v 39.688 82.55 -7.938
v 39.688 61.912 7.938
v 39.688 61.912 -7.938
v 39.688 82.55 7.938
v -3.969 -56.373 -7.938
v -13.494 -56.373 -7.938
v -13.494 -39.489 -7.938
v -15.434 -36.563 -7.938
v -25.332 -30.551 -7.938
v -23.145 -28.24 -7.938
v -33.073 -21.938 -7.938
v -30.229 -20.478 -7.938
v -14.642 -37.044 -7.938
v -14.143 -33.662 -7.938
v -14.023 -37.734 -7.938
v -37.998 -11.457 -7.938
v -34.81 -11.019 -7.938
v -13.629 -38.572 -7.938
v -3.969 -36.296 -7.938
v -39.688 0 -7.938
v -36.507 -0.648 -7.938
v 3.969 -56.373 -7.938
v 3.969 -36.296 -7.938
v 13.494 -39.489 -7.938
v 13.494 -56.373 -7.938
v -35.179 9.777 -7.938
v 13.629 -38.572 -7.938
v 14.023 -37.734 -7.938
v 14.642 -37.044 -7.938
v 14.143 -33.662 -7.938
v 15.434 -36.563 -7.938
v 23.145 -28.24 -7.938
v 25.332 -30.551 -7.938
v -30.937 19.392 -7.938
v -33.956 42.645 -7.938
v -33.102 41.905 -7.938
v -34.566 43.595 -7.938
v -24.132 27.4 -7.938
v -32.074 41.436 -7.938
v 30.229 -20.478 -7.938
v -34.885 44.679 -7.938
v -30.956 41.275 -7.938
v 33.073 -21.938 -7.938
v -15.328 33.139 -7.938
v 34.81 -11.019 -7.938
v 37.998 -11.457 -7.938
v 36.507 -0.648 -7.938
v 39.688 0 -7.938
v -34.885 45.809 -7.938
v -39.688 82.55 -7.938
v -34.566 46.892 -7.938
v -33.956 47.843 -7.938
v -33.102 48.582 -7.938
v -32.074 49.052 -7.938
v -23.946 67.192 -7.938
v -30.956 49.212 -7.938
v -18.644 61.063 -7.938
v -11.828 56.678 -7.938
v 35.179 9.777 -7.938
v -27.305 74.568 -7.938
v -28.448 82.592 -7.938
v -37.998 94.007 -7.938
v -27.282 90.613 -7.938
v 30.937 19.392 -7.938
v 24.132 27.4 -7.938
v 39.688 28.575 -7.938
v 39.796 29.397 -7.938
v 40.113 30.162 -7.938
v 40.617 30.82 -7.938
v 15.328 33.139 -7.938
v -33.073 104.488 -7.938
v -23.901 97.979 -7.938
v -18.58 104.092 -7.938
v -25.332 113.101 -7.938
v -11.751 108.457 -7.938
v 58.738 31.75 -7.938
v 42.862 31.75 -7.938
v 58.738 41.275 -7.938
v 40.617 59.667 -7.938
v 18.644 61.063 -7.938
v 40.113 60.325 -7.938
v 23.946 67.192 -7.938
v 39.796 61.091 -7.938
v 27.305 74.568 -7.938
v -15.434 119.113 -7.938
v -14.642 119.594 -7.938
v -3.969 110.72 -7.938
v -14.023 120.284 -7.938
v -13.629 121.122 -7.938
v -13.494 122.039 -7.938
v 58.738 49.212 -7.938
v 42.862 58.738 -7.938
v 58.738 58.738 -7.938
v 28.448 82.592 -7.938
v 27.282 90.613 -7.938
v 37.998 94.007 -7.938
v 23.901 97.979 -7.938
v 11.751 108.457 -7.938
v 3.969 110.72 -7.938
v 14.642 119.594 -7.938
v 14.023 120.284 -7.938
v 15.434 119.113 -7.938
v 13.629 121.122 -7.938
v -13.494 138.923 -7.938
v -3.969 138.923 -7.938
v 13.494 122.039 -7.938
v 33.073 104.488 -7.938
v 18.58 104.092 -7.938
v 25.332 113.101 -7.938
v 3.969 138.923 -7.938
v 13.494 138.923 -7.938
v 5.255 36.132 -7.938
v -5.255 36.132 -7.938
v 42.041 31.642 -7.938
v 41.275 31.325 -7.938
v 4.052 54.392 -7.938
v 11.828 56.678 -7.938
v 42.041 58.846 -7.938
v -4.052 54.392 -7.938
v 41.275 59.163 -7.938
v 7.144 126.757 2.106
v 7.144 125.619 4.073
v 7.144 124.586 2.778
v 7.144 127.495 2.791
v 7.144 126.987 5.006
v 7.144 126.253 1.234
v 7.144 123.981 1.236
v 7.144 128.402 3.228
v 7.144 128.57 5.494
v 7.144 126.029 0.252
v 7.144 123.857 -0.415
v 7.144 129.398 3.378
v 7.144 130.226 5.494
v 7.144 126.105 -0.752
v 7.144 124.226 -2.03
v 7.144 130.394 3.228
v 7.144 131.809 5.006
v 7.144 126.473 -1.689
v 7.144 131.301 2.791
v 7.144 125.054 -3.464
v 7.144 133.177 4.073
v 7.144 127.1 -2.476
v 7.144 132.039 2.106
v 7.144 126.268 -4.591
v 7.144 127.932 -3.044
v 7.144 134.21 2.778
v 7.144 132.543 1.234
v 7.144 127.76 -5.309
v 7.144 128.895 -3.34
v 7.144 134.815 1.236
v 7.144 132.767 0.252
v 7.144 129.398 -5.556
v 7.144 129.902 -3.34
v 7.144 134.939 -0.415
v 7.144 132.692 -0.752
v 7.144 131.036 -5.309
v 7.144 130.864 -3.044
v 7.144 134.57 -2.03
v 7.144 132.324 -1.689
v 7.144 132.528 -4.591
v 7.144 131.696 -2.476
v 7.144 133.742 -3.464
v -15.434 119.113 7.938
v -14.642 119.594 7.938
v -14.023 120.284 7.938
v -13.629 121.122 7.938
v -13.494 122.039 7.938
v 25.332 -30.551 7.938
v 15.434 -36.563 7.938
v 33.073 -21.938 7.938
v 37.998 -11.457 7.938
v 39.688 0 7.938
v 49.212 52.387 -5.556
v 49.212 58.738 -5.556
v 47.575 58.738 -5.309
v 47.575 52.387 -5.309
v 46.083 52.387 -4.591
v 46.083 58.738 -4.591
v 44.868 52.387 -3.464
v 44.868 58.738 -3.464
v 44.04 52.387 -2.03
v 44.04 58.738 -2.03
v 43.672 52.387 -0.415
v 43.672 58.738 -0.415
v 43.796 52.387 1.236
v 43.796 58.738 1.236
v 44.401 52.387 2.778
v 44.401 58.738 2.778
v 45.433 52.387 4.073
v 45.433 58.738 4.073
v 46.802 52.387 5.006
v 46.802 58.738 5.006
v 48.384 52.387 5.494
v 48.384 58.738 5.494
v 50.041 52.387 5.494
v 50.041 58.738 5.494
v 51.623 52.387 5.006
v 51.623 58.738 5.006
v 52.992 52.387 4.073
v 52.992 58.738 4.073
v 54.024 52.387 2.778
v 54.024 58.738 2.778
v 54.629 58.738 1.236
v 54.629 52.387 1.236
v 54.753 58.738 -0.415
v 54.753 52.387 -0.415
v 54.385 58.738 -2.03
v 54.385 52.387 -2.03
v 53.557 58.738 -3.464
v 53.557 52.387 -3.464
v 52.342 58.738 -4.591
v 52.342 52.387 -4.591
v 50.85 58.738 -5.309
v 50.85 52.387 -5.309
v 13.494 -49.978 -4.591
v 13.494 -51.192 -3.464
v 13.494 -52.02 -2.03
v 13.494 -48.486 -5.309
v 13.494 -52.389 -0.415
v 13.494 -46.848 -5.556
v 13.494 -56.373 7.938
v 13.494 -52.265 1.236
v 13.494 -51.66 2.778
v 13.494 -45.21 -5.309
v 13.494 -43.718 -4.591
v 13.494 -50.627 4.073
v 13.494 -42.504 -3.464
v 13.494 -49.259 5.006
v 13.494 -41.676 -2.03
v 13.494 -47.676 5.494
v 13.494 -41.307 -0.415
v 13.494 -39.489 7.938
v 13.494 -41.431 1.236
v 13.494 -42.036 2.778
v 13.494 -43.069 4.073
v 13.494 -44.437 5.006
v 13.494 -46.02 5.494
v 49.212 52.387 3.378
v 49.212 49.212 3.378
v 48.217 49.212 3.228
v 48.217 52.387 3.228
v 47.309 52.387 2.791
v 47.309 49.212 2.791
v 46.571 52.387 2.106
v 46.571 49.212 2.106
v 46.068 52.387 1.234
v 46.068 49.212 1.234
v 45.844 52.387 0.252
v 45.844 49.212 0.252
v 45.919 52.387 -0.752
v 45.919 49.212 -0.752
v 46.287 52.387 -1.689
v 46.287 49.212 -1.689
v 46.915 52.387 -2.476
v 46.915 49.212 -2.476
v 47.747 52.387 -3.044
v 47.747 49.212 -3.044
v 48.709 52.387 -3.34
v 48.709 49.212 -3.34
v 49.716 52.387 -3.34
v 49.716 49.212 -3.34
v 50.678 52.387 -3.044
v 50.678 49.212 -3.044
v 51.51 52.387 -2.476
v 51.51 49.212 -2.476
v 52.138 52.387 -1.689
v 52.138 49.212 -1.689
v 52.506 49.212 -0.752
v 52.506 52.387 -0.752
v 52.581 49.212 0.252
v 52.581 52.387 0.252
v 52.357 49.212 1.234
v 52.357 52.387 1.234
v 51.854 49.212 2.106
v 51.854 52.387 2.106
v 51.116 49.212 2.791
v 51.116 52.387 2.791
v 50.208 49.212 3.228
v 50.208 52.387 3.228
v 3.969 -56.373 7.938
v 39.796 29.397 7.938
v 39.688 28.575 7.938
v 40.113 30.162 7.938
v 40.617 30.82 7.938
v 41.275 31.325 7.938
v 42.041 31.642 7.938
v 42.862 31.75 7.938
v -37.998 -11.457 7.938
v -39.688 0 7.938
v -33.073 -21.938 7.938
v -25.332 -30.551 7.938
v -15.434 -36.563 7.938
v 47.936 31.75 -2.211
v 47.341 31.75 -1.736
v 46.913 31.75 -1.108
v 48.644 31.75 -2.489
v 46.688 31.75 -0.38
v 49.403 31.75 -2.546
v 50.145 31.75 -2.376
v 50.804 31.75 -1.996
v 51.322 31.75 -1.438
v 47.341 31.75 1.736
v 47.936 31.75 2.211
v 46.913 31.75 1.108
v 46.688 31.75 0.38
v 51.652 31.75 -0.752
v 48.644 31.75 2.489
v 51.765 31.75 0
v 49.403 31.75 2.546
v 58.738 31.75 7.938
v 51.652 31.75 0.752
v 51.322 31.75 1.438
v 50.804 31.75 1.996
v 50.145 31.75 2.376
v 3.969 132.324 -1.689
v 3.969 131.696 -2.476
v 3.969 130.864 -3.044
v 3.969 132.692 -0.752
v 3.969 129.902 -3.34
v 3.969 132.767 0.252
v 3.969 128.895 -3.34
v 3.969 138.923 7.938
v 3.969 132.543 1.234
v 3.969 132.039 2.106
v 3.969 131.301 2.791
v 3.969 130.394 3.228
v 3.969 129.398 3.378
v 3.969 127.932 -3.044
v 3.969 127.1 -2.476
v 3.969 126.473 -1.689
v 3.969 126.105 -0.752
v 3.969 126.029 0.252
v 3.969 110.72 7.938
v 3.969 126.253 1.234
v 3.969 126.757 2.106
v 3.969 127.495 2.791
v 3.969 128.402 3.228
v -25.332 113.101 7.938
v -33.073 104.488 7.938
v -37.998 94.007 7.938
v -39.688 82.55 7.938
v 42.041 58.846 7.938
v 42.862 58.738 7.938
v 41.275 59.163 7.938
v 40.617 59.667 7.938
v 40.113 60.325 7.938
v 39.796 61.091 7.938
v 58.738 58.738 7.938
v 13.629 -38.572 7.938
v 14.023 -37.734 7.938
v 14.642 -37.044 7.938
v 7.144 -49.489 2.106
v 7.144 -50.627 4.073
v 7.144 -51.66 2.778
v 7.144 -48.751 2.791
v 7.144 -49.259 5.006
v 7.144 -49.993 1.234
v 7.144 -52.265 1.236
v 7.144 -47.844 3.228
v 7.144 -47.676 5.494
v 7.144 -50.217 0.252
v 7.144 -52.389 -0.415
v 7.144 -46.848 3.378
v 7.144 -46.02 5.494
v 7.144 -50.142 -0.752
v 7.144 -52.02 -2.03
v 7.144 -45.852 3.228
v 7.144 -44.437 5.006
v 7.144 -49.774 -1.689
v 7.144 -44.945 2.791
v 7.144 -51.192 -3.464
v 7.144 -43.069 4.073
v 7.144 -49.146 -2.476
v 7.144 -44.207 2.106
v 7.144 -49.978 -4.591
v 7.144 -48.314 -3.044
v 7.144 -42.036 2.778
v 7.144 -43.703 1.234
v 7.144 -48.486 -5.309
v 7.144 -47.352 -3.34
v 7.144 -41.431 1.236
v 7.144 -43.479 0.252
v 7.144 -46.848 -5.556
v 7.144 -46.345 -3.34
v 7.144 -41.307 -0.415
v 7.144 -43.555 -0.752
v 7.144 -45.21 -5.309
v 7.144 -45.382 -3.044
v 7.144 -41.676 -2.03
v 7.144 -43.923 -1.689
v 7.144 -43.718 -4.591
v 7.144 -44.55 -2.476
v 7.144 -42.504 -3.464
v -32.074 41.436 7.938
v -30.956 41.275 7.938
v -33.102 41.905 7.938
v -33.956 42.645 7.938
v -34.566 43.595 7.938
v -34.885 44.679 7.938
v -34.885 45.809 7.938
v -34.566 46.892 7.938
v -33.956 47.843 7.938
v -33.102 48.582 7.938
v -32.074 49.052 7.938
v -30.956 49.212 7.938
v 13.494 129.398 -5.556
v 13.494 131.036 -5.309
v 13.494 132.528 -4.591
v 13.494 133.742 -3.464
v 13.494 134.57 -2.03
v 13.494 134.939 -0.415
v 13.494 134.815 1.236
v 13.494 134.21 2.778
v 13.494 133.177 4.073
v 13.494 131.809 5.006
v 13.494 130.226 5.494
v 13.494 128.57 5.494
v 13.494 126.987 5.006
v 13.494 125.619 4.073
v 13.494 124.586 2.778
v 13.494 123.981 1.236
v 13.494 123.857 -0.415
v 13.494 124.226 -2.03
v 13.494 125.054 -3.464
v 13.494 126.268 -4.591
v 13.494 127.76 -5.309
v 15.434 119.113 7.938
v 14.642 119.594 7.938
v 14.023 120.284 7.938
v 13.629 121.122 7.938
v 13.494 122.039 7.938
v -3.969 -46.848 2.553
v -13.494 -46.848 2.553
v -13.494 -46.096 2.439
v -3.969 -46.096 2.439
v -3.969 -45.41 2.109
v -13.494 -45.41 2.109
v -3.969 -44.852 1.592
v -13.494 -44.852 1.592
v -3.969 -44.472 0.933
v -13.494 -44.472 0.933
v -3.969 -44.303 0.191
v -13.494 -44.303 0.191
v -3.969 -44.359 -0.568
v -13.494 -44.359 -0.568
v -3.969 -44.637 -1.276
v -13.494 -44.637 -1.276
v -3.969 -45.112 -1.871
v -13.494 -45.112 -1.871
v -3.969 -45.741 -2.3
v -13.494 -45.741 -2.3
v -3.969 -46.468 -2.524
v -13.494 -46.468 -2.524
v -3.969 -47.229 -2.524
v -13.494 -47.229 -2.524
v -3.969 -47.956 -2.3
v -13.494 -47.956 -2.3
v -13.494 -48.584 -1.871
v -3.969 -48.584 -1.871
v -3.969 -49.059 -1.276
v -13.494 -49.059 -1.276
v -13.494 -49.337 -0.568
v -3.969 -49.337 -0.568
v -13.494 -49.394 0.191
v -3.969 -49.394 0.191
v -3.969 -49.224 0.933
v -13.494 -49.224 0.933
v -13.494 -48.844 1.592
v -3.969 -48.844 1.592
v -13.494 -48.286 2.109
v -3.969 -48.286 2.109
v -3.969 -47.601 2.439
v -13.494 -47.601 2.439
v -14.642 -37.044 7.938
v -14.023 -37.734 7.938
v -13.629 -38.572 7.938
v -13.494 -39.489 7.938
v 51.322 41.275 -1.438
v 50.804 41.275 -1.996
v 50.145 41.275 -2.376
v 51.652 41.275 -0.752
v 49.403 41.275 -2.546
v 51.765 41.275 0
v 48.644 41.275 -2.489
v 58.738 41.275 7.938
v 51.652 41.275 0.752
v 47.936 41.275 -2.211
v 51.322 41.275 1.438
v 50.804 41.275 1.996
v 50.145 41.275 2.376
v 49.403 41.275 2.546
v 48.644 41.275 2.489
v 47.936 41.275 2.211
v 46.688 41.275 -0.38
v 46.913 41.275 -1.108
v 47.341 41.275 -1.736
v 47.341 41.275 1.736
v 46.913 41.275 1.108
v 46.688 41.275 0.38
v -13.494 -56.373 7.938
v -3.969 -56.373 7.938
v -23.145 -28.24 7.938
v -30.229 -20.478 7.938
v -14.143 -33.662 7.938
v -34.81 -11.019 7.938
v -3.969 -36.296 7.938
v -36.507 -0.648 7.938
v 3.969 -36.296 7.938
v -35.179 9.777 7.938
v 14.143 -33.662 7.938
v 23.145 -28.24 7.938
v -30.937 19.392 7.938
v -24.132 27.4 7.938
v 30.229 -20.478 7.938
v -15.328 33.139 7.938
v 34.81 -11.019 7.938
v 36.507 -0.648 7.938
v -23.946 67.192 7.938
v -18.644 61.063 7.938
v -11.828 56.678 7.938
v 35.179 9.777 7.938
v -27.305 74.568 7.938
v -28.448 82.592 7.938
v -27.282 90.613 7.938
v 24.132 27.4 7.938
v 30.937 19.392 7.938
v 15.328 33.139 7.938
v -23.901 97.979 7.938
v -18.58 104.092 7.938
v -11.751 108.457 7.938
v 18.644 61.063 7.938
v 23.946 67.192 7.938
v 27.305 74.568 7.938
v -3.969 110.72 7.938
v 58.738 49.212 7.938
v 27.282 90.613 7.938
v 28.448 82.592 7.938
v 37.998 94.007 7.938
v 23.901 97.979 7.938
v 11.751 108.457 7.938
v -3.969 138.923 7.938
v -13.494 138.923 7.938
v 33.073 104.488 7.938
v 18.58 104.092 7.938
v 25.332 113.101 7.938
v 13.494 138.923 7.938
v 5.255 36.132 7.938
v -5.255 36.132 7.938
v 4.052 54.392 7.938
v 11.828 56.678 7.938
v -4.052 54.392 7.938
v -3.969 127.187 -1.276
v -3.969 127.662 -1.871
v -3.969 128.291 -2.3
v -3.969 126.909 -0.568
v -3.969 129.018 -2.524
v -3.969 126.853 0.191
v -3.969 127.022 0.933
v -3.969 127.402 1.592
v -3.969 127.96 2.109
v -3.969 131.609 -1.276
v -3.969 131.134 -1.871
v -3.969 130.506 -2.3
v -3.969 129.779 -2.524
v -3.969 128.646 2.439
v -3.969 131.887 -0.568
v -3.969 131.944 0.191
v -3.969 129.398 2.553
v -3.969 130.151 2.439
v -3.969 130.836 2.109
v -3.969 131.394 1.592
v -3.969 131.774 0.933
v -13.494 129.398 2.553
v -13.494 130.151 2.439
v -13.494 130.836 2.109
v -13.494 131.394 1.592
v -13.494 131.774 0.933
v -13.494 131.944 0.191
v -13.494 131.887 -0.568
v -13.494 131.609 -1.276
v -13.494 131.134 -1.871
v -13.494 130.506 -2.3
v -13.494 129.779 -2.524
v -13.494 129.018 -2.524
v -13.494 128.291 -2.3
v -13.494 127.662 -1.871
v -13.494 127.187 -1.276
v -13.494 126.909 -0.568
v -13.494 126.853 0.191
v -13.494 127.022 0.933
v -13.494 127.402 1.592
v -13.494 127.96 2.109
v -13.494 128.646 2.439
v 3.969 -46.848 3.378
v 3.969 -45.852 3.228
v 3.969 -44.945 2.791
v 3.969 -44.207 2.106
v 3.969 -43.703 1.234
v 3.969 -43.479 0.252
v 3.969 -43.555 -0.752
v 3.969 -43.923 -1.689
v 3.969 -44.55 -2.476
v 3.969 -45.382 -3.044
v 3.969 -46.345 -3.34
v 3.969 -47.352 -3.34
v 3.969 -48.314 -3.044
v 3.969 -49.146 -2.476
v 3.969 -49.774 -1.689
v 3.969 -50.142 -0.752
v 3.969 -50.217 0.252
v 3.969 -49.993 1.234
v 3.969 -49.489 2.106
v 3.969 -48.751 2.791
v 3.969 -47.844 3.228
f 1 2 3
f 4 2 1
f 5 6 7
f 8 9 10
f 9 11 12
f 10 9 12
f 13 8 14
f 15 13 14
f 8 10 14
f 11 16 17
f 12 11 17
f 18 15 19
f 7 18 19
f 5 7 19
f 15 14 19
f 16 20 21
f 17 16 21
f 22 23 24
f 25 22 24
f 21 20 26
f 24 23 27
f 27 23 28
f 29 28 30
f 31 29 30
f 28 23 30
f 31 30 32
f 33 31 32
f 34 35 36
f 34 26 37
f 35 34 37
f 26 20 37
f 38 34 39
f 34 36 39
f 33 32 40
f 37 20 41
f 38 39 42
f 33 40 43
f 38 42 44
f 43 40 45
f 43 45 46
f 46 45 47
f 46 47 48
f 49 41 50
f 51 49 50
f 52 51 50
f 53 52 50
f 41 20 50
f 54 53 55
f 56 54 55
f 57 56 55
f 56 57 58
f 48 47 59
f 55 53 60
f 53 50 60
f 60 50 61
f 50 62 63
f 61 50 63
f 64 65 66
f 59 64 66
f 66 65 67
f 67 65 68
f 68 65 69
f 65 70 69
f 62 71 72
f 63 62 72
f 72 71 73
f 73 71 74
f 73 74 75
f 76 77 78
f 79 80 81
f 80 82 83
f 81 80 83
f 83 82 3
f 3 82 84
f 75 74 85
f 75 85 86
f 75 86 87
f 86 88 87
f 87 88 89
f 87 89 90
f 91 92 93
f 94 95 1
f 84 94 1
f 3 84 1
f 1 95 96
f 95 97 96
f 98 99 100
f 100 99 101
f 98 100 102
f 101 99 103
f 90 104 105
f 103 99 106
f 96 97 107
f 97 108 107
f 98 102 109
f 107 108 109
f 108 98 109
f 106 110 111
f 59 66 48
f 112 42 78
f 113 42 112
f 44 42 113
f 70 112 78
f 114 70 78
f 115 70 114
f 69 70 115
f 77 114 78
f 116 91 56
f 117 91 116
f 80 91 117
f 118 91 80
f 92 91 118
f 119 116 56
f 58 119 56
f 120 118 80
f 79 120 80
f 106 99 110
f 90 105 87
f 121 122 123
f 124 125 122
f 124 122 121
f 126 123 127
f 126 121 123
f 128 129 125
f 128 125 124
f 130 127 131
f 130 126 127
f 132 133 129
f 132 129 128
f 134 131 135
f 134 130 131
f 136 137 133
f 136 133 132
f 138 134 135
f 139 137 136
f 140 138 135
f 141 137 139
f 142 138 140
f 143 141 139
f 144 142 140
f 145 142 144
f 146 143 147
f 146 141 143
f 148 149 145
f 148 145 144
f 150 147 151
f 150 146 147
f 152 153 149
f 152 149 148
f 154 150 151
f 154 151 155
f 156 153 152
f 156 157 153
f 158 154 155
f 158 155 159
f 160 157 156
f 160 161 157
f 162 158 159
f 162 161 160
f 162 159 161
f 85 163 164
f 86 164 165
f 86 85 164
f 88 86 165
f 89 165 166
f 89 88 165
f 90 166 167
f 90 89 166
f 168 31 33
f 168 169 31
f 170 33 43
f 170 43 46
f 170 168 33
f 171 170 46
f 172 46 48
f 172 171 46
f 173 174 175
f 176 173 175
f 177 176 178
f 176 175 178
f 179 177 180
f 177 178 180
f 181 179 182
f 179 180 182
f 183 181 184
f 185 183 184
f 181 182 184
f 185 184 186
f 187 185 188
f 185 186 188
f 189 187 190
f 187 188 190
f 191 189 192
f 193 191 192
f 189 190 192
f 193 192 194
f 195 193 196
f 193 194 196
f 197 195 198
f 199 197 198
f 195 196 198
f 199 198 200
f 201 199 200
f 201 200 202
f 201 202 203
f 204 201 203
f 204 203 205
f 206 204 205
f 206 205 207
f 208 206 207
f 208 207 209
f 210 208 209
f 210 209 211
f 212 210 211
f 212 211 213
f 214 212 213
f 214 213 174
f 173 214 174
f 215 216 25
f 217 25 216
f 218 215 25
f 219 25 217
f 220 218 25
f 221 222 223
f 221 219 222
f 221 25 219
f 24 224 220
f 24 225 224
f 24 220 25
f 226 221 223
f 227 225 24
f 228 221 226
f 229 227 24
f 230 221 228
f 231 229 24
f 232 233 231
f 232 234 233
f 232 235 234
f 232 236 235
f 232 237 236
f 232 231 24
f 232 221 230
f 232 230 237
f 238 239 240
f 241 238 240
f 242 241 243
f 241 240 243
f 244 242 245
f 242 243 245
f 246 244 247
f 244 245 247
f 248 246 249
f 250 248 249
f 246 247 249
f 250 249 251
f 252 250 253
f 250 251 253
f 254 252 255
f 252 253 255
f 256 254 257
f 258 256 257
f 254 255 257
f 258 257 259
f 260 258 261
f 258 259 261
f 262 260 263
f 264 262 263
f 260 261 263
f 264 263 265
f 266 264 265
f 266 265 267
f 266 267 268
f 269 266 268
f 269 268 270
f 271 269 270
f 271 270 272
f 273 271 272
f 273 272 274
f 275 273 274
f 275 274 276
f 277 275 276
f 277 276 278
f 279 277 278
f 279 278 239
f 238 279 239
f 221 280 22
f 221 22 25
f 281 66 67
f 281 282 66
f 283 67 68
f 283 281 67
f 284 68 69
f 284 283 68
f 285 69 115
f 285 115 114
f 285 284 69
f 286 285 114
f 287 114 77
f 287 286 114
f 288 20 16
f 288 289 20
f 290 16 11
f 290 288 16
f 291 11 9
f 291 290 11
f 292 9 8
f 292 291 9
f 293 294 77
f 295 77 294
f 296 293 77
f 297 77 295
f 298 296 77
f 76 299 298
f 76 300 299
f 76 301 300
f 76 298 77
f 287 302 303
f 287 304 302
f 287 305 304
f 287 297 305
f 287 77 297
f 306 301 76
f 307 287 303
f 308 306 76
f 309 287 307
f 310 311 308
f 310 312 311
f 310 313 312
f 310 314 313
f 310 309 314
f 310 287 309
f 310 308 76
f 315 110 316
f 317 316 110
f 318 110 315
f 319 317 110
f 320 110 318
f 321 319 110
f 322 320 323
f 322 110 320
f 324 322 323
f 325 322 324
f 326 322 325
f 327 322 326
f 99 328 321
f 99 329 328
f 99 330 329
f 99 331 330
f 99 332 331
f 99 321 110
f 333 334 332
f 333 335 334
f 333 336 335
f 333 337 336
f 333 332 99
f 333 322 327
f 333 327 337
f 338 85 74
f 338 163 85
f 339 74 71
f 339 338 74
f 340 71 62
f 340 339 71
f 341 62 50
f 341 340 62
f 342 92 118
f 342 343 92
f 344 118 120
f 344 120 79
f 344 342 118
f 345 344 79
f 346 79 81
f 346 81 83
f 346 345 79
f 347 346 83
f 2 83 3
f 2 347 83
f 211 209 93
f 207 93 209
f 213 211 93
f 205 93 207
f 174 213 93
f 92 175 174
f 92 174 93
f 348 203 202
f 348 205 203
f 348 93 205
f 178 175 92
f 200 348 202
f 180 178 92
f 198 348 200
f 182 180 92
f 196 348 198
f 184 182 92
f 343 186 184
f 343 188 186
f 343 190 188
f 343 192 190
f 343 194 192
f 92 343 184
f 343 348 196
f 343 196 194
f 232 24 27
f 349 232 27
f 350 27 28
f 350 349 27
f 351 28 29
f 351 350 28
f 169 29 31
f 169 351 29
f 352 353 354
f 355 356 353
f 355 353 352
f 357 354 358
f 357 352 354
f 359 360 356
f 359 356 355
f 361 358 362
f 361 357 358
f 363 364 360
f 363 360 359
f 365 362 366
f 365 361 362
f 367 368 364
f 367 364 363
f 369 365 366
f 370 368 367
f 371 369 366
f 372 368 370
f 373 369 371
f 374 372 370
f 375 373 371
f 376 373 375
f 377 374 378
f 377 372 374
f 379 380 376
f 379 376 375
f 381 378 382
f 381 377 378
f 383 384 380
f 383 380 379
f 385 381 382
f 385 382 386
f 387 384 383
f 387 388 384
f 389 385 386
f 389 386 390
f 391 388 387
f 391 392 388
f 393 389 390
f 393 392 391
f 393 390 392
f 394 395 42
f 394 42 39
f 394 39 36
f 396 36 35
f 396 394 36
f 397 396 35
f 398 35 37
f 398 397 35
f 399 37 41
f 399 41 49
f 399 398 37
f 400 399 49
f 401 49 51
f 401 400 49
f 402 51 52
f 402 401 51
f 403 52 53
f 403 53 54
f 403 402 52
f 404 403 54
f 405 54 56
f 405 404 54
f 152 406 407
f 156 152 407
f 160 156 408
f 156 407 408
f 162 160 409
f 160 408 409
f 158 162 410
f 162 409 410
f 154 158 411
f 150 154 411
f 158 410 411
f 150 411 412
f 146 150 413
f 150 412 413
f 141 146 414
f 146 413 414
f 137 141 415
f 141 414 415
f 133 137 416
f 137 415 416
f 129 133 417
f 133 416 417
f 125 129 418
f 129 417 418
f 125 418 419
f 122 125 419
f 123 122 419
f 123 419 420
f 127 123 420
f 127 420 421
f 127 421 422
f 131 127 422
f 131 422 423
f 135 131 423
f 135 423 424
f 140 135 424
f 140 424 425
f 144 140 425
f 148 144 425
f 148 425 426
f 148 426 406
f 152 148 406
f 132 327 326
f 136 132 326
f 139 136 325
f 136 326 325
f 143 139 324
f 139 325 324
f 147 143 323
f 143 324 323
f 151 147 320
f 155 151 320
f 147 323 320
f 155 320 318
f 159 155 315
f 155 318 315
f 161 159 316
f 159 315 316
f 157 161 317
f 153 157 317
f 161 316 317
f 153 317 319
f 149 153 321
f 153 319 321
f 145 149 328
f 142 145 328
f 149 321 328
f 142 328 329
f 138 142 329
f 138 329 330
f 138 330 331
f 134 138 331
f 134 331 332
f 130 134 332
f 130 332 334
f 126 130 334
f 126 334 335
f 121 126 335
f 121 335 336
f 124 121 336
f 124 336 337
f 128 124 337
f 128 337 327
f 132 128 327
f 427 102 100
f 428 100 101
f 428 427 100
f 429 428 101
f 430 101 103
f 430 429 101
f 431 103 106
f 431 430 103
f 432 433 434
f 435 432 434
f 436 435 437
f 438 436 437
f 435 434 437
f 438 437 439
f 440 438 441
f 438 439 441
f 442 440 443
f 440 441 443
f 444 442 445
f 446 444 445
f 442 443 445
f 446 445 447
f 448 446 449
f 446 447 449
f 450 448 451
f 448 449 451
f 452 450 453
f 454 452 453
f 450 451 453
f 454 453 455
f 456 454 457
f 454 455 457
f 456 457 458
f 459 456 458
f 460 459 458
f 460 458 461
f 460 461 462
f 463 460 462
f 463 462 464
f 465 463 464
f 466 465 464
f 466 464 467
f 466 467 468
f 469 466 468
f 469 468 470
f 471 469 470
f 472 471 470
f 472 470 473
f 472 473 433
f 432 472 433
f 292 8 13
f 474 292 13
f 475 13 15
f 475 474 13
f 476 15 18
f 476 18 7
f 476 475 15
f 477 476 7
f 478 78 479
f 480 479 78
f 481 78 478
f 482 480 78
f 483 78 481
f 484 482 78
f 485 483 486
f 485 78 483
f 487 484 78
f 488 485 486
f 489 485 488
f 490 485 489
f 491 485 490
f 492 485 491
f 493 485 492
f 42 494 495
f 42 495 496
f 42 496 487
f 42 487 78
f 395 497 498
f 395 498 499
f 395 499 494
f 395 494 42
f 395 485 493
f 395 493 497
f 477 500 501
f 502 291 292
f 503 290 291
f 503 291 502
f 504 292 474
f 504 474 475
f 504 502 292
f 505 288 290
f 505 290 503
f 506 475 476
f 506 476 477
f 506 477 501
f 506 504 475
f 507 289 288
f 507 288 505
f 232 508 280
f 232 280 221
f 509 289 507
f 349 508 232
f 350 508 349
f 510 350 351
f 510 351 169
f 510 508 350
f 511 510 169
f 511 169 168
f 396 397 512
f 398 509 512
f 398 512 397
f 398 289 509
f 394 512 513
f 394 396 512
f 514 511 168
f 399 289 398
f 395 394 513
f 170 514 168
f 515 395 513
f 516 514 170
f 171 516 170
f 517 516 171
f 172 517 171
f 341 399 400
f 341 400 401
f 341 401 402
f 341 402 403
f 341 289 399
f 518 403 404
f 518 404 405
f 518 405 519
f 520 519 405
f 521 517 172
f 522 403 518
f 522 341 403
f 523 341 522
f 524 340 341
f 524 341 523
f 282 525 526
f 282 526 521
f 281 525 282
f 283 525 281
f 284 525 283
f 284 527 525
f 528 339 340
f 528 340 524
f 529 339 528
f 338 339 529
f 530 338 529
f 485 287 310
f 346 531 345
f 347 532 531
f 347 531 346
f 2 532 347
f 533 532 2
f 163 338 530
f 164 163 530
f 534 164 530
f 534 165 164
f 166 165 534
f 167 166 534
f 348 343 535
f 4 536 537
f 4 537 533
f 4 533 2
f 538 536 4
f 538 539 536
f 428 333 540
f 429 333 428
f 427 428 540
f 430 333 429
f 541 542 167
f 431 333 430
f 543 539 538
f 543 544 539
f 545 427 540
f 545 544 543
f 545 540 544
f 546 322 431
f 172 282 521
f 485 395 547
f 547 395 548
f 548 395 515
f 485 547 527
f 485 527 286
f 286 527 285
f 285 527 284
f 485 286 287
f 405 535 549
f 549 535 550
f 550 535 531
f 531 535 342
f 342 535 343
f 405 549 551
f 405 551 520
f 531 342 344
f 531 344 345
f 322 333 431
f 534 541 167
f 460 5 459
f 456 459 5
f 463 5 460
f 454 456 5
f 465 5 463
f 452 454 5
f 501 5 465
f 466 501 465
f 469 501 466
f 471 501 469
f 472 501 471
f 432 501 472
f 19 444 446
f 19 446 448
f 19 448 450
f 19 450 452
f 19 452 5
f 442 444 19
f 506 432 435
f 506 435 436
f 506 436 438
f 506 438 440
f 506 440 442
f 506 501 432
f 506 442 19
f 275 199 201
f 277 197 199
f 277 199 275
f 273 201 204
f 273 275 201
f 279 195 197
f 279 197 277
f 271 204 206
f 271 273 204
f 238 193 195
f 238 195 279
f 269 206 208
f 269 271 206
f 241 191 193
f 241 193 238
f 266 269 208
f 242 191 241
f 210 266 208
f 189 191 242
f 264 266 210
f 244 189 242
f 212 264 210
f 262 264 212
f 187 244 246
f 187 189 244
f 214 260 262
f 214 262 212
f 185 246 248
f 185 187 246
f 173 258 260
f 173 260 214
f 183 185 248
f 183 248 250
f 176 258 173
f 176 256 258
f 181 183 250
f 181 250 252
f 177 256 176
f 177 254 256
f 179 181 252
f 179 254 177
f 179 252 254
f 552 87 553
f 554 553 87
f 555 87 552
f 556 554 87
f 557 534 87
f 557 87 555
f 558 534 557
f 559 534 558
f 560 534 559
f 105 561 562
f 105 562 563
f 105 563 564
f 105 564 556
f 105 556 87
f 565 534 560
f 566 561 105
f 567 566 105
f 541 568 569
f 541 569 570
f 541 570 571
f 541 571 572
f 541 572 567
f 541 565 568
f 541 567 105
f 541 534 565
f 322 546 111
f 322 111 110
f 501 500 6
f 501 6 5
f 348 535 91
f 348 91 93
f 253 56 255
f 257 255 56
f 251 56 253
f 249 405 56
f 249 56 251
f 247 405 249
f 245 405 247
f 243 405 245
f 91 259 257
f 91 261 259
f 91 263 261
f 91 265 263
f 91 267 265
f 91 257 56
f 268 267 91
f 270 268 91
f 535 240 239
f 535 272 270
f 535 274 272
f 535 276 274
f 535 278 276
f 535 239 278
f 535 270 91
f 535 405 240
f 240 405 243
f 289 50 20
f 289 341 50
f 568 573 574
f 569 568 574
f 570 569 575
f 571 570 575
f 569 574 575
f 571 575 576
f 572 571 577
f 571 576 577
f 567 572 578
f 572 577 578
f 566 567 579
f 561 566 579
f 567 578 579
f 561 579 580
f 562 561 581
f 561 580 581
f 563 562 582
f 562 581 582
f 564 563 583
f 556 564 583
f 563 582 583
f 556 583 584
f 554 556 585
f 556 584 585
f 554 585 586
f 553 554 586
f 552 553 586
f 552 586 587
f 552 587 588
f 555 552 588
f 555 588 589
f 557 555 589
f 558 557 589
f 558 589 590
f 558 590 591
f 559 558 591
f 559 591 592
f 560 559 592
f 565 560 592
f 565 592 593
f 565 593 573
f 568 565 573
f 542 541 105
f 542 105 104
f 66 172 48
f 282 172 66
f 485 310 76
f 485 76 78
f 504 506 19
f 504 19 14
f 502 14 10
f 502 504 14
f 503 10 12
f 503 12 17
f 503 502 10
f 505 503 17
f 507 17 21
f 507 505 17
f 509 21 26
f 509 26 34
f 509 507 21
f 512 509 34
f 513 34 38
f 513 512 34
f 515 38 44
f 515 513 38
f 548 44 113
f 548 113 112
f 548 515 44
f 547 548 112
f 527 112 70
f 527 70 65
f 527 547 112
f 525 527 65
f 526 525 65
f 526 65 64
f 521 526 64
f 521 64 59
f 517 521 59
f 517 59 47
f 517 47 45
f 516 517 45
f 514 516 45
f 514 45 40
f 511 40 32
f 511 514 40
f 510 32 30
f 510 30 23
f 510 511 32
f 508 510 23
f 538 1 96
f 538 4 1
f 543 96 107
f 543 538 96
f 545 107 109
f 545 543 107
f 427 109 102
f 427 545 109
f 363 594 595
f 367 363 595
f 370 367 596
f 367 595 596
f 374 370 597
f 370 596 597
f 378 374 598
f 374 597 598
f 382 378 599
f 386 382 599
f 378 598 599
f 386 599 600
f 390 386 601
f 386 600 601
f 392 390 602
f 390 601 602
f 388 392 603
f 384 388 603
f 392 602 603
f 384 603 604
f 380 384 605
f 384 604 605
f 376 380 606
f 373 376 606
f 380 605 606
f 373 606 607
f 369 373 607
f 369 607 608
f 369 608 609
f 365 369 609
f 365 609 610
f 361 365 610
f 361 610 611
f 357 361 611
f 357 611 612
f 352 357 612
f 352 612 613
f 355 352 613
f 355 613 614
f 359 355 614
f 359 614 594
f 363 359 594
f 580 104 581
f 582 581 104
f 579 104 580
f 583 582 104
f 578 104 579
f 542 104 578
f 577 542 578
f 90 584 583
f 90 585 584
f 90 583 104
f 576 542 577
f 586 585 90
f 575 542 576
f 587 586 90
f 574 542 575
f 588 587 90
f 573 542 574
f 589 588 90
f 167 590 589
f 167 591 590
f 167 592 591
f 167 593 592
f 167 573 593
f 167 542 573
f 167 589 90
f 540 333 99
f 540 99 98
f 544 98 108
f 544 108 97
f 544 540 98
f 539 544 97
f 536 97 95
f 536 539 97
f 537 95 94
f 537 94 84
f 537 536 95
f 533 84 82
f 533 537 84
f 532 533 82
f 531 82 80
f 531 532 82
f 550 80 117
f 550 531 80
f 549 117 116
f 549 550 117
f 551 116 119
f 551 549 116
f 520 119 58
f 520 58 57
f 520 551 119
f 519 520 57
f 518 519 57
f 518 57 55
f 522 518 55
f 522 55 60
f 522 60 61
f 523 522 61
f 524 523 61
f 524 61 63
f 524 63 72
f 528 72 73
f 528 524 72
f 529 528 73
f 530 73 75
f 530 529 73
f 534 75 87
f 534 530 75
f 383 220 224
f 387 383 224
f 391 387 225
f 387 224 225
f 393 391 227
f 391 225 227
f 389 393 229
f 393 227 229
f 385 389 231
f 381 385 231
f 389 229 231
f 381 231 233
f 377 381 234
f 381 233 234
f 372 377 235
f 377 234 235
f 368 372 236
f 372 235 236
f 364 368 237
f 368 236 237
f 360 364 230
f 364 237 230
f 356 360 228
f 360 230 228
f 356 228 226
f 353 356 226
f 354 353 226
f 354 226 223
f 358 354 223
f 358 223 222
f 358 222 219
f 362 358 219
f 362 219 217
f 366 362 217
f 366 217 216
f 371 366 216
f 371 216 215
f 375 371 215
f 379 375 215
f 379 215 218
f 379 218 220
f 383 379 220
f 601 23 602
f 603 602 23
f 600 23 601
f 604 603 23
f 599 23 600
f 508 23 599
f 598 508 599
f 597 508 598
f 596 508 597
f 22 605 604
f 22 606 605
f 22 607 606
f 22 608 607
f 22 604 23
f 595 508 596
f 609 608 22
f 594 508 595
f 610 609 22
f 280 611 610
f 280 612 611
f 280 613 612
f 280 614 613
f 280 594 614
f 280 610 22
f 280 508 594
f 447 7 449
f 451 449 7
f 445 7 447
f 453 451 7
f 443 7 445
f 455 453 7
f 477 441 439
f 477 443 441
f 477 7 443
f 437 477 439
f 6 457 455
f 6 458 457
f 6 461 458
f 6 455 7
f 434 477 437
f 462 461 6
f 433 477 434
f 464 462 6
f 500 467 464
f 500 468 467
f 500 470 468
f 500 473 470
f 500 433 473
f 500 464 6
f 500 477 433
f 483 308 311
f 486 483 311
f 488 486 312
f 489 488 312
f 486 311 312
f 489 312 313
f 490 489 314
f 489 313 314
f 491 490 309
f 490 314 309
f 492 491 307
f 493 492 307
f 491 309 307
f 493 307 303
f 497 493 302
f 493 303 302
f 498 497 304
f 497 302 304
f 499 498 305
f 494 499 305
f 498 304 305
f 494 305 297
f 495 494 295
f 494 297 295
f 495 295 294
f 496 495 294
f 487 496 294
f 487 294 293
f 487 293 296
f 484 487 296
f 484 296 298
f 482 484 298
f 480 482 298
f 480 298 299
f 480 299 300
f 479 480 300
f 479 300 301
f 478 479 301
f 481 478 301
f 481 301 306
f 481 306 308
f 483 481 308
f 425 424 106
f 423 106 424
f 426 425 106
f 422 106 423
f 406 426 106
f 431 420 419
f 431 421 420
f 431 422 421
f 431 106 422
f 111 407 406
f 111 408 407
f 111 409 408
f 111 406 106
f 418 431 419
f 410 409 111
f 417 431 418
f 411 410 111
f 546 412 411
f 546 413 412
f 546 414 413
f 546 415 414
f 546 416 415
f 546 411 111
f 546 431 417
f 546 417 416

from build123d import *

# Parameters (mm, degrees)
EXTRUDE1_DEPTH                                   = 7.9375
CBORE_FOR_1_4_SOCKET_HEAD_CAP_SCREW1_D           = 6.7564
CBORE_FOR_1_4_SOCKET_HEAD_CAP_SCREW1_DEPTH       = 9.525
CBORE_FOR_1_4_SOCKET_HEAD_CAP_SCREW1_CBORE_D     = 11.1125
CBORE_FOR_1_4_SOCKET_HEAD_CAP_SCREW1_CBORE_DEPTH = 6.35
F_1_4_20_TAPPED_HOLE1_D                          = 5.1054
CBORE_FOR_1_4_SOCKET_HEAD_CAP_SCREW2_D           = 6.7564
CBORE_FOR_1_4_SOCKET_HEAD_CAP_SCREW2_DEPTH       = 9.525
CBORE_FOR_1_4_SOCKET_HEAD_CAP_SCREW2_CBORE_D     = 11.1125
CBORE_FOR_1_4_SOCKET_HEAD_CAP_SCREW2_CBORE_DEPTH = 6.35
F_1_4_20_TAPPED_HOLE3_D                          = 5.1054
CBORE_FOR_1_4_SOCKET_HEAD_CAP_SCREW3_D           = 6.7564
CBORE_FOR_1_4_SOCKET_HEAD_CAP_SCREW3_DEPTH       = 9.525
CBORE_FOR_1_4_SOCKET_HEAD_CAP_SCREW3_CBORE_D     = 11.1125
CBORE_FOR_1_4_SOCKET_HEAD_CAP_SCREW3_CBORE_DEPTH = 6.35
F_1_4_20_TAPPED_HOLE4_D                          = 5.1054
FILLET1_R                                        = 3.175


with BuildPart() as part:
    # Sketch1 → Extrude1 (new, symmetric)
    with BuildSketch(Plane.XY):
        with BuildLine():
            Line((-39.6875, 82.55), (-39.6875, 0))
            ThreePointArc((-39.6875, 0), (-32.485618813, -22.798733003), (-13.49375, -37.323134477))
            Line((-13.49375, -37.323134477), (-13.49375, -56.373134477))
            Line((-13.49375, -56.373134477), (-3.96875, -56.373134477))
            Line((-3.96875, -56.373134477), (-3.96875, -36.296166184))
            ThreePointArc((-3.96875, -36.296166184), (0, 36.5125), (3.96875, -36.296166184))
            Line((3.96875, -36.296166184), (3.96875, -56.373134477))
            Line((3.96875, -56.373134477), (13.49375, -56.373134477))
            Line((13.49375, -56.373134477), (13.49375, -37.323134477))
            ThreePointArc((13.49375, -37.323134477), (32.485618813, -22.798733003), (39.6875, 0))
            Line((39.6875, 0), (39.6875, 31.75))
            Line((39.6875, 31.75), (58.7375, 31.75))
            Line((58.7375, 31.75), (58.7375, 41.275))
            Line((58.7375, 41.275), (-30.95625, 41.275))
            ThreePointArc((-30.95625, 41.275), (-34.925, 45.24375), (-30.95625, 49.2125))
            Line((-30.95625, 49.2125), (58.7375, 49.2125))
            Line((58.7375, 49.2125), (58.7375, 58.7375))
            Line((58.7375, 58.7375), (39.6875, 58.7375))
            Line((39.6875, 58.7375), (39.6875, 82.55))
            ThreePointArc((39.6875, 82.55), (32.485618813, 105.348733003), (13.49375, 119.873134477))
            Line((13.49375, 119.873134477), (13.49375, 138.923134477))
            Line((13.49375, 138.923134477), (3.96875, 138.923134477))
            Line((3.96875, 138.923134477), (3.96875, 110.719801693))
            ThreePointArc((3.96875, 110.719801693), (0, 54.102), (-3.96875, 110.719801693))
            Line((-3.96875, 110.719801693), (-3.96875, 138.923134477))
            Line((-3.96875, 138.923134477), (-13.49375, 138.923134477))
            Line((-13.49375, 138.923134477), (-13.49375, 119.873134477))
            ThreePointArc((-13.49375, 119.873134477), (-32.485618813, 105.348733003), (-39.6875, 82.55))
        make_face()
    extrude(amount=EXTRUDE1_DEPTH, both=True)

    # CBORE for 1/4 Socket Head Cap Screw1
    with Locations(Plane(origin=(13.49375, 0, 0), x_dir=(0, 0, -1), z_dir=(1, 0, 0))):
        with Locations((0, 129.398134477)):
            CounterBoreHole(CBORE_FOR_1_4_SOCKET_HEAD_CAP_SCREW1_D / 2, CBORE_FOR_1_4_SOCKET_HEAD_CAP_SCREW1_CBORE_D / 2, CBORE_FOR_1_4_SOCKET_HEAD_CAP_SCREW1_CBORE_DEPTH, depth=CBORE_FOR_1_4_SOCKET_HEAD_CAP_SCREW1_DEPTH)

    # 1/4-20 Tapped Hole1 (through all)
    with Locations(Plane(origin=(-3.96875, 0, 0), x_dir=(0, 0, -1), z_dir=(1, 0, 0))):
        with Locations((0, 129.398134477)):
            Hole(F_1_4_20_TAPPED_HOLE1_D / 2)

    # CBORE for 1/4 Socket Head Cap Screw2
    with Locations(Plane(origin=(0, 58.7375, 0), x_dir=(0, 0, -1), z_dir=(0, 1, 0))):
        with Locations((0, -49.2125)):
            CounterBoreHole(CBORE_FOR_1_4_SOCKET_HEAD_CAP_SCREW2_D / 2, CBORE_FOR_1_4_SOCKET_HEAD_CAP_SCREW2_CBORE_D / 2, CBORE_FOR_1_4_SOCKET_HEAD_CAP_SCREW2_CBORE_DEPTH, depth=CBORE_FOR_1_4_SOCKET_HEAD_CAP_SCREW2_DEPTH)

    # 1/4-20 Tapped Hole3 (through all)
    with Locations(Plane(origin=(0, 41.275, 0), x_dir=(-1, 0, 0), z_dir=(0, 1, 0))):
        with Locations((-49.2125, 0)):
            Hole(F_1_4_20_TAPPED_HOLE3_D / 2)

    # CBORE for 1/4 Socket Head Cap Screw3
    with Locations(Plane(origin=(13.49375, 0, 0), x_dir=(0, 0, -1), z_dir=(1, 0, 0))):
        with Locations((0, -46.848134477)):
            CounterBoreHole(CBORE_FOR_1_4_SOCKET_HEAD_CAP_SCREW3_D / 2, CBORE_FOR_1_4_SOCKET_HEAD_CAP_SCREW3_CBORE_D / 2, CBORE_FOR_1_4_SOCKET_HEAD_CAP_SCREW3_CBORE_DEPTH, depth=CBORE_FOR_1_4_SOCKET_HEAD_CAP_SCREW3_DEPTH)

    # 1/4-20 Tapped Hole4 (through all)
    with Locations(Plane(origin=(-3.96875, 0, 0), x_dir=(0, 0, -1), z_dir=(1, 0, 0))):
        with Locations((0, -46.848134477)):
            Hole(F_1_4_20_TAPPED_HOLE4_D / 2)

    # Fillet1
    fillet1_edges = [part.edges().sort_by_distance(p)[0] for p in [
        (39.6875, 31.75, 0),
        (13.49375, -37.323134477, 0),
        (-13.49375, -37.323134477, 0),
        (-13.49375, 119.873134477, 0),
        (13.49375, 119.873134477, 0),
        (39.6875, 58.7375, 0),
    ]]
    fillet(fillet1_edges, radius=FILLET1_R)


solid = part.part
